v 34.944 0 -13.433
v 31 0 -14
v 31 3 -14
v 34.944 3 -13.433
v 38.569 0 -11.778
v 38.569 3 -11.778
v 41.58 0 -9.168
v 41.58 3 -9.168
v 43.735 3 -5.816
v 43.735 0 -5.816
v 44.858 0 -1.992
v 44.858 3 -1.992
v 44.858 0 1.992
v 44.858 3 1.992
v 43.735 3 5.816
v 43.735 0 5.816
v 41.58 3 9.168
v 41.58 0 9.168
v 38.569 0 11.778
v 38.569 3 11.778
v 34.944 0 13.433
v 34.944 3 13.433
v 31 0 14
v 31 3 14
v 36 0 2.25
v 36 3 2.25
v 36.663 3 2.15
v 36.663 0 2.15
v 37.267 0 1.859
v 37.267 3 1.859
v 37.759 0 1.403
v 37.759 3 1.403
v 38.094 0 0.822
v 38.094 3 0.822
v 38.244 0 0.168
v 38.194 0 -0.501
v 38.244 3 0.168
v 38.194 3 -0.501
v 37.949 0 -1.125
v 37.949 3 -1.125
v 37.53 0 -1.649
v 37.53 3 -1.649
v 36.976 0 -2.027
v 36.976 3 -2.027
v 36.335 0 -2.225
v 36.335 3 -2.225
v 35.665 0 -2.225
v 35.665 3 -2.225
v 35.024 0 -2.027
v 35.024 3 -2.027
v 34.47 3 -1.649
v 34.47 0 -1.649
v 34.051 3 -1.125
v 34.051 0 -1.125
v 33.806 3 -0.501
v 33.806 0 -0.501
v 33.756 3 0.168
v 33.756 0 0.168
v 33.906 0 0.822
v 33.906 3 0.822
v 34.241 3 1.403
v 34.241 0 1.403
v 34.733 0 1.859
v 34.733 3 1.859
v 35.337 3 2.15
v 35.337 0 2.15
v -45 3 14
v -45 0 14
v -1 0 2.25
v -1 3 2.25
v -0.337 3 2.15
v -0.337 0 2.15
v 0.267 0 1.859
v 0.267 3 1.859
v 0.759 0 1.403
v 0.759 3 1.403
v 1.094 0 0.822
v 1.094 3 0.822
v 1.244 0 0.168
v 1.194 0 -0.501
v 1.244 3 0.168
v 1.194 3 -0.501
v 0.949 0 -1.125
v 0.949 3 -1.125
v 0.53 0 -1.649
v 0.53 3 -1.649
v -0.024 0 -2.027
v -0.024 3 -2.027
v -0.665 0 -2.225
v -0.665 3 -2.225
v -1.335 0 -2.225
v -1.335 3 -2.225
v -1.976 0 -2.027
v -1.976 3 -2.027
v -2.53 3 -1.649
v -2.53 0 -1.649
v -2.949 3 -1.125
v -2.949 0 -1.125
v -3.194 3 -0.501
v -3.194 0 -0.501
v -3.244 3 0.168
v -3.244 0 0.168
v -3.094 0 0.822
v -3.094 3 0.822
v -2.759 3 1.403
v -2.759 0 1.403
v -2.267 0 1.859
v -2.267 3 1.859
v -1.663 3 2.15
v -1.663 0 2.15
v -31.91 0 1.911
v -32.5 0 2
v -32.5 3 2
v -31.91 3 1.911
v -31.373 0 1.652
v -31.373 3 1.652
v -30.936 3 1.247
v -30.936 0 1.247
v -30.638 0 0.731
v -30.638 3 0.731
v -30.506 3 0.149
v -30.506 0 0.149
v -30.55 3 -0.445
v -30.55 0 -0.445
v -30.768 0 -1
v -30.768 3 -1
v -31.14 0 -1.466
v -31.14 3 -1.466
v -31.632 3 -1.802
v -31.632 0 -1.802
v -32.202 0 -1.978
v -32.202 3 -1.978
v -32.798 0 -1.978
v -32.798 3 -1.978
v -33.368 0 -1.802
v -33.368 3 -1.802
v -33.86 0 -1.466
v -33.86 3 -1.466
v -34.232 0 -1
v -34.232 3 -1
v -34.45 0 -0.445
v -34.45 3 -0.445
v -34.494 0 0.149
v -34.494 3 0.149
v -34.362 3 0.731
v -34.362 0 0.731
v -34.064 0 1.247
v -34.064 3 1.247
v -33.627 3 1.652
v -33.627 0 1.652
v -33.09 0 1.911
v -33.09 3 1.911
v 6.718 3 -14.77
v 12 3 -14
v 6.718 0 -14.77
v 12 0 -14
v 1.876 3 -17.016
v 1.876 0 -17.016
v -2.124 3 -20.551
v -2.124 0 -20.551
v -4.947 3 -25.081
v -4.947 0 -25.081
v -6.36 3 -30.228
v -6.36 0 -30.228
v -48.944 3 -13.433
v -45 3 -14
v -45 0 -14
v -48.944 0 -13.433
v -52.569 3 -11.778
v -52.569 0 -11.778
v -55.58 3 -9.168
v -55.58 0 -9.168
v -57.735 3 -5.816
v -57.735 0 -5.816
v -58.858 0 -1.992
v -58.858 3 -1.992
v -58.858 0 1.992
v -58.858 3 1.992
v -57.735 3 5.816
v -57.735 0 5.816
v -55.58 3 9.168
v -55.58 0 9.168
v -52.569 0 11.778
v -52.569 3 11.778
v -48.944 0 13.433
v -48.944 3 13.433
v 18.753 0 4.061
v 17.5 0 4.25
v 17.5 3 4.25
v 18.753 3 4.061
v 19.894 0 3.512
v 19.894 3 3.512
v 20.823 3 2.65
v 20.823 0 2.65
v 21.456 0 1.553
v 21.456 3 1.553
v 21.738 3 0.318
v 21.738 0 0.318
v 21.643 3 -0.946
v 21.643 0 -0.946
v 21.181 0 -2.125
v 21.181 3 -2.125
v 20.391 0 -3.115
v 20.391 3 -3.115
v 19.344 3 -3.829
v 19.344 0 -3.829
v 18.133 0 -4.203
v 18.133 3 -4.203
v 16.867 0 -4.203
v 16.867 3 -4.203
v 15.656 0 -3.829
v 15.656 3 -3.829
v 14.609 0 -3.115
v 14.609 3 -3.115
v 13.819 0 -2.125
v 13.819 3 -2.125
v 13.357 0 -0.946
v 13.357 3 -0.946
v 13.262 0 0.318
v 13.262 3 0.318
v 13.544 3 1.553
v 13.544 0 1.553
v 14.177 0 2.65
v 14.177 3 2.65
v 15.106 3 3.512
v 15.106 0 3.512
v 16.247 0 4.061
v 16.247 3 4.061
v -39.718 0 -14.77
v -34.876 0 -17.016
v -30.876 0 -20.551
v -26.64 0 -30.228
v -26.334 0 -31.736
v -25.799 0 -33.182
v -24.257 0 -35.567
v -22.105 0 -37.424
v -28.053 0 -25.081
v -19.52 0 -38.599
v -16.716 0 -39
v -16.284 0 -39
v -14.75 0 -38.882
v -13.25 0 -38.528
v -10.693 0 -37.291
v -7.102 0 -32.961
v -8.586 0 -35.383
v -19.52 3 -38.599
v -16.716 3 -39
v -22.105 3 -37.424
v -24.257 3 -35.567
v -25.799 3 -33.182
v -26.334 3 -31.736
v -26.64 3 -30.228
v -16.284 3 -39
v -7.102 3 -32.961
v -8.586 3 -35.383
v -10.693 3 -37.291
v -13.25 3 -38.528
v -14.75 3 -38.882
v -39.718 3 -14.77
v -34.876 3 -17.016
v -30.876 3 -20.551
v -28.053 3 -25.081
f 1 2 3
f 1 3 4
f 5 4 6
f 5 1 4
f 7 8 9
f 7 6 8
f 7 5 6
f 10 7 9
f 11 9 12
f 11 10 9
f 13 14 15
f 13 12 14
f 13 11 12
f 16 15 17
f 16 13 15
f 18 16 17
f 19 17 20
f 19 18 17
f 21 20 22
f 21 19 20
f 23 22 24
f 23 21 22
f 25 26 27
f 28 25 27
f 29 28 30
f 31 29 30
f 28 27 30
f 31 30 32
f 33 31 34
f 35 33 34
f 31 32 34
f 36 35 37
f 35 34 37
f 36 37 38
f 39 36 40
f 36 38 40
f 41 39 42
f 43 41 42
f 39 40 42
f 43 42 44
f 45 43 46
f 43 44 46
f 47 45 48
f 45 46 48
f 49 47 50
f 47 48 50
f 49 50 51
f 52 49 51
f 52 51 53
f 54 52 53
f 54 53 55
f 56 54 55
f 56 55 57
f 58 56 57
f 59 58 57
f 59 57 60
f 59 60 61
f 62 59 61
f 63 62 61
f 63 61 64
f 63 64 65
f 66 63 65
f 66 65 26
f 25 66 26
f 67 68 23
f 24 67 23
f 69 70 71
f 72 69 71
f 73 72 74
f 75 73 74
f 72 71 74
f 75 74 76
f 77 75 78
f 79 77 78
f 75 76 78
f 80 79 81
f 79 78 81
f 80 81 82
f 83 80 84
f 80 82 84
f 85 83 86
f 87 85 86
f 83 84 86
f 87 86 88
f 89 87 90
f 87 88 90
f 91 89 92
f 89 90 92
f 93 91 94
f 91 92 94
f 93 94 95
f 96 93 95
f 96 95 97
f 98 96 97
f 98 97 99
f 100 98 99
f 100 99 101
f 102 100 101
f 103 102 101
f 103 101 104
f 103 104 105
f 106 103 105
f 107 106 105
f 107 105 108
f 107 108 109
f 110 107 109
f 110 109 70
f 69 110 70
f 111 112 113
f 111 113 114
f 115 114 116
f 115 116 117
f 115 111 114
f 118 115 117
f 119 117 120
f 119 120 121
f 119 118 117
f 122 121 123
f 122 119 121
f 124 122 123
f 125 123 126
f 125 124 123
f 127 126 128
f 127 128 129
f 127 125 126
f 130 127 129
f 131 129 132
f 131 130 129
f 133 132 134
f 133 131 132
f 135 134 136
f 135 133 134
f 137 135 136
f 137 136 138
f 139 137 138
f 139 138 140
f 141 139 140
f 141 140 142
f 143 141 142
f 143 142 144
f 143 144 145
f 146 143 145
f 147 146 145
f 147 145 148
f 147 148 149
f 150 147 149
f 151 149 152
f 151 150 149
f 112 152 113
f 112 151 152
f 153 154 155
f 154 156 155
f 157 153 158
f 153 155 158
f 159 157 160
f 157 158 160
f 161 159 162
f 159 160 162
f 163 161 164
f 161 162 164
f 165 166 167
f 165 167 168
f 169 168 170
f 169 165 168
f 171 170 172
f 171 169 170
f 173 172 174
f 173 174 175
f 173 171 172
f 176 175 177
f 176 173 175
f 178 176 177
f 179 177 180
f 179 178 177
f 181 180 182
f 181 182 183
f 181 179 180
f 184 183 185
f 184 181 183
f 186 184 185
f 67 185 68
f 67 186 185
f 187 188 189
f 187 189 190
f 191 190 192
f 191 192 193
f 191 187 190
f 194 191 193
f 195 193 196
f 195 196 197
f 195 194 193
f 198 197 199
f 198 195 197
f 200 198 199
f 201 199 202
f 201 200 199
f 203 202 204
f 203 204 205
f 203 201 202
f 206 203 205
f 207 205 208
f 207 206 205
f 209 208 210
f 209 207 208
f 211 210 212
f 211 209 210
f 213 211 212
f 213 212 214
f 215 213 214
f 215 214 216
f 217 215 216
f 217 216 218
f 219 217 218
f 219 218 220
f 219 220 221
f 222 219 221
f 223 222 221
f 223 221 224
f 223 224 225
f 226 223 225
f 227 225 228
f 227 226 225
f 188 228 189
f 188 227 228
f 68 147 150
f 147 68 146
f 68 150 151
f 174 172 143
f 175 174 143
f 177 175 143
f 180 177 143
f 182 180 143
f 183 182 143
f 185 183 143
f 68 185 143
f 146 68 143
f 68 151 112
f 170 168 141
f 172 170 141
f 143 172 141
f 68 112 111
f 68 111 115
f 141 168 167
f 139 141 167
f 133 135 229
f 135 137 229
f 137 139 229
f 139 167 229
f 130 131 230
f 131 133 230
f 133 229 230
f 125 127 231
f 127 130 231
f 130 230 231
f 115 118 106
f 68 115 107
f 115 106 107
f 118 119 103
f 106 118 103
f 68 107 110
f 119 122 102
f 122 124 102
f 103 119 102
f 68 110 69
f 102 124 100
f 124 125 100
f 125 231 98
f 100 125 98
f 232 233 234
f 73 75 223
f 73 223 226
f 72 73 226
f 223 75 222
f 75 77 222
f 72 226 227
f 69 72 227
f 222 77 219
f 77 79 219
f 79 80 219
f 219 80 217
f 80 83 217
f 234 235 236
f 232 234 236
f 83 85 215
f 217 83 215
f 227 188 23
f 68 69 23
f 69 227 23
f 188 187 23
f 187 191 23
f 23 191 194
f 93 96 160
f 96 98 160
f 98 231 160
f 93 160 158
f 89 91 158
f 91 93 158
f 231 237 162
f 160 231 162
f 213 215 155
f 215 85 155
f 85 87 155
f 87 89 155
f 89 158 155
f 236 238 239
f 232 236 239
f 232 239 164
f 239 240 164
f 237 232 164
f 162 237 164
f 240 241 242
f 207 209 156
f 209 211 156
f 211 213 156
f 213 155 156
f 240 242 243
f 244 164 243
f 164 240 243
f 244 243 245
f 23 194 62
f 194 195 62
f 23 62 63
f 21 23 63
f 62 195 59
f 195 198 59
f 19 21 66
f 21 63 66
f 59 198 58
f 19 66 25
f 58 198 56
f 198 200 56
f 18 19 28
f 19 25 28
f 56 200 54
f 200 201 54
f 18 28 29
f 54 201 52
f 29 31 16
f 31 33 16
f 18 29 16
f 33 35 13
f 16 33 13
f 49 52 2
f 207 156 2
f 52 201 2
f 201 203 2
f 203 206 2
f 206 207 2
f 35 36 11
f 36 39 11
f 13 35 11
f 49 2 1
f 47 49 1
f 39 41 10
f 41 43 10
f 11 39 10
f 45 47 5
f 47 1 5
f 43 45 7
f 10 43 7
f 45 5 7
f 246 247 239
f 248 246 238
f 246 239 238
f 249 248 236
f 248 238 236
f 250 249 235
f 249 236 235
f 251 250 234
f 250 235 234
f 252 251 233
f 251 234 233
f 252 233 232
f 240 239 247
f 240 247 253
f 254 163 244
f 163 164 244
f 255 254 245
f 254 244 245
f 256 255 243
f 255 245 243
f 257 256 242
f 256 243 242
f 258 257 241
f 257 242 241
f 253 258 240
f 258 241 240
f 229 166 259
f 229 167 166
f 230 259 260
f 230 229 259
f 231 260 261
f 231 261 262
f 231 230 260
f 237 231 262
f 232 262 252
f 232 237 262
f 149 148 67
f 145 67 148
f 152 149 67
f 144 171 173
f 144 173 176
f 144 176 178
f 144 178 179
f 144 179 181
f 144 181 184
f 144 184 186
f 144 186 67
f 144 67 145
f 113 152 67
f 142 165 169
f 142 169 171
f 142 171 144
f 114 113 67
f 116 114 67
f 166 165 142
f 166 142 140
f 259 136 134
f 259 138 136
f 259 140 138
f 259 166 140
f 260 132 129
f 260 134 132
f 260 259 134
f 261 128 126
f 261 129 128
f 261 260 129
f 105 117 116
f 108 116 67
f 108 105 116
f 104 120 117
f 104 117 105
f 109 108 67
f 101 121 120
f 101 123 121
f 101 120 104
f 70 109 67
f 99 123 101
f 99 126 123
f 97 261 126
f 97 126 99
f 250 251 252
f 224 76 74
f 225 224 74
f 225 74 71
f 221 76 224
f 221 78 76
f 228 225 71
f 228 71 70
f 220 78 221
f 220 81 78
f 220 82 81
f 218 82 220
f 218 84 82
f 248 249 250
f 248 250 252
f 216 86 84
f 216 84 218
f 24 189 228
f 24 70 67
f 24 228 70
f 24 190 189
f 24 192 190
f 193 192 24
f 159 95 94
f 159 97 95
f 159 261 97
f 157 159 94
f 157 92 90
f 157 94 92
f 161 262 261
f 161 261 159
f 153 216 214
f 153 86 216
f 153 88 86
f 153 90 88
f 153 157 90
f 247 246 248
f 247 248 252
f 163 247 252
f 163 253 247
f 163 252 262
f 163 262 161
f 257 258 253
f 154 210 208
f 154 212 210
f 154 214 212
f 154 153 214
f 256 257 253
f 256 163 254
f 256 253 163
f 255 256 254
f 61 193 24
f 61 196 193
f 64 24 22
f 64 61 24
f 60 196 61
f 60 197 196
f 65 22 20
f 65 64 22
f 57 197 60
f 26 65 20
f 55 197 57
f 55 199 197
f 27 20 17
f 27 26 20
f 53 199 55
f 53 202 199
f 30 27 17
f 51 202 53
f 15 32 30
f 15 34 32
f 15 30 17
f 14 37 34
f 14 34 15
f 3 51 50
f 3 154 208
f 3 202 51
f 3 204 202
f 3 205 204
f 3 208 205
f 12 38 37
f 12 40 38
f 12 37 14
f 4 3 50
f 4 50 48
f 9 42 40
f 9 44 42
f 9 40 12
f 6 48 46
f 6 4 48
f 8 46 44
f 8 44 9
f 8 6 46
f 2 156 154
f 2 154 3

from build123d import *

# Parameters (mm, degrees)
SKETCH_1_W          = 90
SKETCH_1_H          = 28
SKETCH_1_R          = 4.25
SKETCH_1_R_2        = 2
EXTRUDE_1_DEPTH     = 3
CUT_EXTRUDE_1_REACH = 49.223
SKETCH_3_R          = 2.25
SKETCH_4_W          = 20
SKETCH_4_H          = 25
EXTRUDE_3_DEPTH     = 3
FILLET_6_R          = 18.5
FILLET_9_R          = 10
EXTRUDE_4_DEPTH     = 3
FILLET_11_RADIUS    = 14
FILLET_11_LENGTH    = 3


with BuildPart() as part:
    # 草图1 → 凸台-拉伸1 (new body)
    with BuildSketch(Plane(origin=(0, 0, 0), x_dir=(1, 0, 0), z_dir=(0, 1, 0))):
        Rectangle(SKETCH_1_W, SKETCH_1_H)
        with Locations(Location((17.5, 0, 0), (0, 0, 270))):
            Circle(SKETCH_1_R, mode=Mode.SUBTRACT)
        with Locations(Location((-32.5, 0, 0), (0, 0, 270))):
            Circle(SKETCH_1_R_2, mode=Mode.SUBTRACT)
    extrude(amount=EXTRUDE_1_DEPTH)

    # 草图3 → 切除-拉伸1 (cut, up to next)
    with BuildSketch(Plane(origin=(0, 3, 0), x_dir=(1, 0, 0), z_dir=(0, 1, 0)), mode=Mode.PRIVATE) as cut_extrude_1_sk1:
        with Locations(Location((36, 0, 0), (0, 0, 270))):
            Circle(SKETCH_3_R)
    cut_extrude_1_tool1 = extrude(cut_extrude_1_sk1.sketch, amount=-CUT_EXTRUDE_1_REACH, mode=Mode.PRIVATE) & part.part
    # 草图3 → 切除-拉伸1 (cut, up to next)
    with BuildSketch(Plane(origin=(0, 3, 0), x_dir=(1, 0, 0), z_dir=(0, 1, 0)), mode=Mode.PRIVATE) as cut_extrude_1_sk2:
        with Locations(Location((-1, 0, 0), (0, 0, 270))):
            Circle(SKETCH_3_R)
    cut_extrude_1_tool2 = extrude(cut_extrude_1_sk2.sketch, amount=-CUT_EXTRUDE_1_REACH, mode=Mode.PRIVATE) & part.part
    add(cut_extrude_1_tool1.solids().sort_by_distance((36, 3, 0))[0], mode=Mode.SUBTRACT)
    add(cut_extrude_1_tool2.solids().sort_by_distance((-1, 3, 0))[0], mode=Mode.SUBTRACT)

    # 草图4 → 凸台-拉伸3 (add)
    with BuildSketch(Plane(origin=(0, 3, 0), x_dir=(1, 0, 0), z_dir=(0, 1, 0))):
        with Locations((-16.5, 26.5)):
            Rectangle(SKETCH_4_W, SKETCH_4_H)
    extrude(amount=-EXTRUDE_3_DEPTH)

    # 圆角6
    fillet_6_edges = [part.edges().sort_by_distance(p)[0] for p in [
        (-26.5, 1.5, -14),
        (-6.5, 1.5, -14),
    ]]
    fillet(fillet_6_edges, radius=FILLET_6_R - 0.0001)  # a hair under: the kernel refuses the full size

    # 圆角9
    fillet_9_edges = [part.edges().sort_by_distance(p)[0] for p in [
        (-6.5, 1.5, -39),
        (-26.5, 1.5, -39),
    ]]
    fillet(fillet_9_edges, radius=FILLET_9_R)

    # 草图6 → 凸台-拉伸4 (add)
    with BuildSketch(Plane(origin=(0, 3, 0), x_dir=(1, 0, 0), z_dir=(0, 1, 0))):
        with BuildLine():
            Line((-45, -14), (-45, 14))
            ThreePointArc((-45, 14), (-59, 0), (-45, -14))
        make_face()
    extrude(amount=-EXTRUDE_4_DEPTH)

    # 圆角11: full round fillet: the end face becomes a half cylinder, R = half its width
    fillet_11_face = Plane((45, 1.5, 0), x_dir=(0, -1, 0), z_dir=(1, 0, 0))  # on the end face: x along it, z out of the body
    fillet_11_slab = fillet_11_face.offset(-FILLET_11_RADIUS / 2) * Box(FILLET_11_LENGTH, 2 * FILLET_11_RADIUS, FILLET_11_RADIUS, mode=Mode.PRIVATE)  # the body's end, R deep
    fillet_11_round = Plane((31, 1.5, 0), x_dir=(1, 0, 0), z_dir=(0, -1, 0)) * Cylinder(FILLET_11_RADIUS, FILLET_11_LENGTH, mode=Mode.PRIVATE)  # its axis R under the face
    add(fillet_11_slab - fillet_11_round, mode=Mode.SUBTRACT)


solid = part.part
